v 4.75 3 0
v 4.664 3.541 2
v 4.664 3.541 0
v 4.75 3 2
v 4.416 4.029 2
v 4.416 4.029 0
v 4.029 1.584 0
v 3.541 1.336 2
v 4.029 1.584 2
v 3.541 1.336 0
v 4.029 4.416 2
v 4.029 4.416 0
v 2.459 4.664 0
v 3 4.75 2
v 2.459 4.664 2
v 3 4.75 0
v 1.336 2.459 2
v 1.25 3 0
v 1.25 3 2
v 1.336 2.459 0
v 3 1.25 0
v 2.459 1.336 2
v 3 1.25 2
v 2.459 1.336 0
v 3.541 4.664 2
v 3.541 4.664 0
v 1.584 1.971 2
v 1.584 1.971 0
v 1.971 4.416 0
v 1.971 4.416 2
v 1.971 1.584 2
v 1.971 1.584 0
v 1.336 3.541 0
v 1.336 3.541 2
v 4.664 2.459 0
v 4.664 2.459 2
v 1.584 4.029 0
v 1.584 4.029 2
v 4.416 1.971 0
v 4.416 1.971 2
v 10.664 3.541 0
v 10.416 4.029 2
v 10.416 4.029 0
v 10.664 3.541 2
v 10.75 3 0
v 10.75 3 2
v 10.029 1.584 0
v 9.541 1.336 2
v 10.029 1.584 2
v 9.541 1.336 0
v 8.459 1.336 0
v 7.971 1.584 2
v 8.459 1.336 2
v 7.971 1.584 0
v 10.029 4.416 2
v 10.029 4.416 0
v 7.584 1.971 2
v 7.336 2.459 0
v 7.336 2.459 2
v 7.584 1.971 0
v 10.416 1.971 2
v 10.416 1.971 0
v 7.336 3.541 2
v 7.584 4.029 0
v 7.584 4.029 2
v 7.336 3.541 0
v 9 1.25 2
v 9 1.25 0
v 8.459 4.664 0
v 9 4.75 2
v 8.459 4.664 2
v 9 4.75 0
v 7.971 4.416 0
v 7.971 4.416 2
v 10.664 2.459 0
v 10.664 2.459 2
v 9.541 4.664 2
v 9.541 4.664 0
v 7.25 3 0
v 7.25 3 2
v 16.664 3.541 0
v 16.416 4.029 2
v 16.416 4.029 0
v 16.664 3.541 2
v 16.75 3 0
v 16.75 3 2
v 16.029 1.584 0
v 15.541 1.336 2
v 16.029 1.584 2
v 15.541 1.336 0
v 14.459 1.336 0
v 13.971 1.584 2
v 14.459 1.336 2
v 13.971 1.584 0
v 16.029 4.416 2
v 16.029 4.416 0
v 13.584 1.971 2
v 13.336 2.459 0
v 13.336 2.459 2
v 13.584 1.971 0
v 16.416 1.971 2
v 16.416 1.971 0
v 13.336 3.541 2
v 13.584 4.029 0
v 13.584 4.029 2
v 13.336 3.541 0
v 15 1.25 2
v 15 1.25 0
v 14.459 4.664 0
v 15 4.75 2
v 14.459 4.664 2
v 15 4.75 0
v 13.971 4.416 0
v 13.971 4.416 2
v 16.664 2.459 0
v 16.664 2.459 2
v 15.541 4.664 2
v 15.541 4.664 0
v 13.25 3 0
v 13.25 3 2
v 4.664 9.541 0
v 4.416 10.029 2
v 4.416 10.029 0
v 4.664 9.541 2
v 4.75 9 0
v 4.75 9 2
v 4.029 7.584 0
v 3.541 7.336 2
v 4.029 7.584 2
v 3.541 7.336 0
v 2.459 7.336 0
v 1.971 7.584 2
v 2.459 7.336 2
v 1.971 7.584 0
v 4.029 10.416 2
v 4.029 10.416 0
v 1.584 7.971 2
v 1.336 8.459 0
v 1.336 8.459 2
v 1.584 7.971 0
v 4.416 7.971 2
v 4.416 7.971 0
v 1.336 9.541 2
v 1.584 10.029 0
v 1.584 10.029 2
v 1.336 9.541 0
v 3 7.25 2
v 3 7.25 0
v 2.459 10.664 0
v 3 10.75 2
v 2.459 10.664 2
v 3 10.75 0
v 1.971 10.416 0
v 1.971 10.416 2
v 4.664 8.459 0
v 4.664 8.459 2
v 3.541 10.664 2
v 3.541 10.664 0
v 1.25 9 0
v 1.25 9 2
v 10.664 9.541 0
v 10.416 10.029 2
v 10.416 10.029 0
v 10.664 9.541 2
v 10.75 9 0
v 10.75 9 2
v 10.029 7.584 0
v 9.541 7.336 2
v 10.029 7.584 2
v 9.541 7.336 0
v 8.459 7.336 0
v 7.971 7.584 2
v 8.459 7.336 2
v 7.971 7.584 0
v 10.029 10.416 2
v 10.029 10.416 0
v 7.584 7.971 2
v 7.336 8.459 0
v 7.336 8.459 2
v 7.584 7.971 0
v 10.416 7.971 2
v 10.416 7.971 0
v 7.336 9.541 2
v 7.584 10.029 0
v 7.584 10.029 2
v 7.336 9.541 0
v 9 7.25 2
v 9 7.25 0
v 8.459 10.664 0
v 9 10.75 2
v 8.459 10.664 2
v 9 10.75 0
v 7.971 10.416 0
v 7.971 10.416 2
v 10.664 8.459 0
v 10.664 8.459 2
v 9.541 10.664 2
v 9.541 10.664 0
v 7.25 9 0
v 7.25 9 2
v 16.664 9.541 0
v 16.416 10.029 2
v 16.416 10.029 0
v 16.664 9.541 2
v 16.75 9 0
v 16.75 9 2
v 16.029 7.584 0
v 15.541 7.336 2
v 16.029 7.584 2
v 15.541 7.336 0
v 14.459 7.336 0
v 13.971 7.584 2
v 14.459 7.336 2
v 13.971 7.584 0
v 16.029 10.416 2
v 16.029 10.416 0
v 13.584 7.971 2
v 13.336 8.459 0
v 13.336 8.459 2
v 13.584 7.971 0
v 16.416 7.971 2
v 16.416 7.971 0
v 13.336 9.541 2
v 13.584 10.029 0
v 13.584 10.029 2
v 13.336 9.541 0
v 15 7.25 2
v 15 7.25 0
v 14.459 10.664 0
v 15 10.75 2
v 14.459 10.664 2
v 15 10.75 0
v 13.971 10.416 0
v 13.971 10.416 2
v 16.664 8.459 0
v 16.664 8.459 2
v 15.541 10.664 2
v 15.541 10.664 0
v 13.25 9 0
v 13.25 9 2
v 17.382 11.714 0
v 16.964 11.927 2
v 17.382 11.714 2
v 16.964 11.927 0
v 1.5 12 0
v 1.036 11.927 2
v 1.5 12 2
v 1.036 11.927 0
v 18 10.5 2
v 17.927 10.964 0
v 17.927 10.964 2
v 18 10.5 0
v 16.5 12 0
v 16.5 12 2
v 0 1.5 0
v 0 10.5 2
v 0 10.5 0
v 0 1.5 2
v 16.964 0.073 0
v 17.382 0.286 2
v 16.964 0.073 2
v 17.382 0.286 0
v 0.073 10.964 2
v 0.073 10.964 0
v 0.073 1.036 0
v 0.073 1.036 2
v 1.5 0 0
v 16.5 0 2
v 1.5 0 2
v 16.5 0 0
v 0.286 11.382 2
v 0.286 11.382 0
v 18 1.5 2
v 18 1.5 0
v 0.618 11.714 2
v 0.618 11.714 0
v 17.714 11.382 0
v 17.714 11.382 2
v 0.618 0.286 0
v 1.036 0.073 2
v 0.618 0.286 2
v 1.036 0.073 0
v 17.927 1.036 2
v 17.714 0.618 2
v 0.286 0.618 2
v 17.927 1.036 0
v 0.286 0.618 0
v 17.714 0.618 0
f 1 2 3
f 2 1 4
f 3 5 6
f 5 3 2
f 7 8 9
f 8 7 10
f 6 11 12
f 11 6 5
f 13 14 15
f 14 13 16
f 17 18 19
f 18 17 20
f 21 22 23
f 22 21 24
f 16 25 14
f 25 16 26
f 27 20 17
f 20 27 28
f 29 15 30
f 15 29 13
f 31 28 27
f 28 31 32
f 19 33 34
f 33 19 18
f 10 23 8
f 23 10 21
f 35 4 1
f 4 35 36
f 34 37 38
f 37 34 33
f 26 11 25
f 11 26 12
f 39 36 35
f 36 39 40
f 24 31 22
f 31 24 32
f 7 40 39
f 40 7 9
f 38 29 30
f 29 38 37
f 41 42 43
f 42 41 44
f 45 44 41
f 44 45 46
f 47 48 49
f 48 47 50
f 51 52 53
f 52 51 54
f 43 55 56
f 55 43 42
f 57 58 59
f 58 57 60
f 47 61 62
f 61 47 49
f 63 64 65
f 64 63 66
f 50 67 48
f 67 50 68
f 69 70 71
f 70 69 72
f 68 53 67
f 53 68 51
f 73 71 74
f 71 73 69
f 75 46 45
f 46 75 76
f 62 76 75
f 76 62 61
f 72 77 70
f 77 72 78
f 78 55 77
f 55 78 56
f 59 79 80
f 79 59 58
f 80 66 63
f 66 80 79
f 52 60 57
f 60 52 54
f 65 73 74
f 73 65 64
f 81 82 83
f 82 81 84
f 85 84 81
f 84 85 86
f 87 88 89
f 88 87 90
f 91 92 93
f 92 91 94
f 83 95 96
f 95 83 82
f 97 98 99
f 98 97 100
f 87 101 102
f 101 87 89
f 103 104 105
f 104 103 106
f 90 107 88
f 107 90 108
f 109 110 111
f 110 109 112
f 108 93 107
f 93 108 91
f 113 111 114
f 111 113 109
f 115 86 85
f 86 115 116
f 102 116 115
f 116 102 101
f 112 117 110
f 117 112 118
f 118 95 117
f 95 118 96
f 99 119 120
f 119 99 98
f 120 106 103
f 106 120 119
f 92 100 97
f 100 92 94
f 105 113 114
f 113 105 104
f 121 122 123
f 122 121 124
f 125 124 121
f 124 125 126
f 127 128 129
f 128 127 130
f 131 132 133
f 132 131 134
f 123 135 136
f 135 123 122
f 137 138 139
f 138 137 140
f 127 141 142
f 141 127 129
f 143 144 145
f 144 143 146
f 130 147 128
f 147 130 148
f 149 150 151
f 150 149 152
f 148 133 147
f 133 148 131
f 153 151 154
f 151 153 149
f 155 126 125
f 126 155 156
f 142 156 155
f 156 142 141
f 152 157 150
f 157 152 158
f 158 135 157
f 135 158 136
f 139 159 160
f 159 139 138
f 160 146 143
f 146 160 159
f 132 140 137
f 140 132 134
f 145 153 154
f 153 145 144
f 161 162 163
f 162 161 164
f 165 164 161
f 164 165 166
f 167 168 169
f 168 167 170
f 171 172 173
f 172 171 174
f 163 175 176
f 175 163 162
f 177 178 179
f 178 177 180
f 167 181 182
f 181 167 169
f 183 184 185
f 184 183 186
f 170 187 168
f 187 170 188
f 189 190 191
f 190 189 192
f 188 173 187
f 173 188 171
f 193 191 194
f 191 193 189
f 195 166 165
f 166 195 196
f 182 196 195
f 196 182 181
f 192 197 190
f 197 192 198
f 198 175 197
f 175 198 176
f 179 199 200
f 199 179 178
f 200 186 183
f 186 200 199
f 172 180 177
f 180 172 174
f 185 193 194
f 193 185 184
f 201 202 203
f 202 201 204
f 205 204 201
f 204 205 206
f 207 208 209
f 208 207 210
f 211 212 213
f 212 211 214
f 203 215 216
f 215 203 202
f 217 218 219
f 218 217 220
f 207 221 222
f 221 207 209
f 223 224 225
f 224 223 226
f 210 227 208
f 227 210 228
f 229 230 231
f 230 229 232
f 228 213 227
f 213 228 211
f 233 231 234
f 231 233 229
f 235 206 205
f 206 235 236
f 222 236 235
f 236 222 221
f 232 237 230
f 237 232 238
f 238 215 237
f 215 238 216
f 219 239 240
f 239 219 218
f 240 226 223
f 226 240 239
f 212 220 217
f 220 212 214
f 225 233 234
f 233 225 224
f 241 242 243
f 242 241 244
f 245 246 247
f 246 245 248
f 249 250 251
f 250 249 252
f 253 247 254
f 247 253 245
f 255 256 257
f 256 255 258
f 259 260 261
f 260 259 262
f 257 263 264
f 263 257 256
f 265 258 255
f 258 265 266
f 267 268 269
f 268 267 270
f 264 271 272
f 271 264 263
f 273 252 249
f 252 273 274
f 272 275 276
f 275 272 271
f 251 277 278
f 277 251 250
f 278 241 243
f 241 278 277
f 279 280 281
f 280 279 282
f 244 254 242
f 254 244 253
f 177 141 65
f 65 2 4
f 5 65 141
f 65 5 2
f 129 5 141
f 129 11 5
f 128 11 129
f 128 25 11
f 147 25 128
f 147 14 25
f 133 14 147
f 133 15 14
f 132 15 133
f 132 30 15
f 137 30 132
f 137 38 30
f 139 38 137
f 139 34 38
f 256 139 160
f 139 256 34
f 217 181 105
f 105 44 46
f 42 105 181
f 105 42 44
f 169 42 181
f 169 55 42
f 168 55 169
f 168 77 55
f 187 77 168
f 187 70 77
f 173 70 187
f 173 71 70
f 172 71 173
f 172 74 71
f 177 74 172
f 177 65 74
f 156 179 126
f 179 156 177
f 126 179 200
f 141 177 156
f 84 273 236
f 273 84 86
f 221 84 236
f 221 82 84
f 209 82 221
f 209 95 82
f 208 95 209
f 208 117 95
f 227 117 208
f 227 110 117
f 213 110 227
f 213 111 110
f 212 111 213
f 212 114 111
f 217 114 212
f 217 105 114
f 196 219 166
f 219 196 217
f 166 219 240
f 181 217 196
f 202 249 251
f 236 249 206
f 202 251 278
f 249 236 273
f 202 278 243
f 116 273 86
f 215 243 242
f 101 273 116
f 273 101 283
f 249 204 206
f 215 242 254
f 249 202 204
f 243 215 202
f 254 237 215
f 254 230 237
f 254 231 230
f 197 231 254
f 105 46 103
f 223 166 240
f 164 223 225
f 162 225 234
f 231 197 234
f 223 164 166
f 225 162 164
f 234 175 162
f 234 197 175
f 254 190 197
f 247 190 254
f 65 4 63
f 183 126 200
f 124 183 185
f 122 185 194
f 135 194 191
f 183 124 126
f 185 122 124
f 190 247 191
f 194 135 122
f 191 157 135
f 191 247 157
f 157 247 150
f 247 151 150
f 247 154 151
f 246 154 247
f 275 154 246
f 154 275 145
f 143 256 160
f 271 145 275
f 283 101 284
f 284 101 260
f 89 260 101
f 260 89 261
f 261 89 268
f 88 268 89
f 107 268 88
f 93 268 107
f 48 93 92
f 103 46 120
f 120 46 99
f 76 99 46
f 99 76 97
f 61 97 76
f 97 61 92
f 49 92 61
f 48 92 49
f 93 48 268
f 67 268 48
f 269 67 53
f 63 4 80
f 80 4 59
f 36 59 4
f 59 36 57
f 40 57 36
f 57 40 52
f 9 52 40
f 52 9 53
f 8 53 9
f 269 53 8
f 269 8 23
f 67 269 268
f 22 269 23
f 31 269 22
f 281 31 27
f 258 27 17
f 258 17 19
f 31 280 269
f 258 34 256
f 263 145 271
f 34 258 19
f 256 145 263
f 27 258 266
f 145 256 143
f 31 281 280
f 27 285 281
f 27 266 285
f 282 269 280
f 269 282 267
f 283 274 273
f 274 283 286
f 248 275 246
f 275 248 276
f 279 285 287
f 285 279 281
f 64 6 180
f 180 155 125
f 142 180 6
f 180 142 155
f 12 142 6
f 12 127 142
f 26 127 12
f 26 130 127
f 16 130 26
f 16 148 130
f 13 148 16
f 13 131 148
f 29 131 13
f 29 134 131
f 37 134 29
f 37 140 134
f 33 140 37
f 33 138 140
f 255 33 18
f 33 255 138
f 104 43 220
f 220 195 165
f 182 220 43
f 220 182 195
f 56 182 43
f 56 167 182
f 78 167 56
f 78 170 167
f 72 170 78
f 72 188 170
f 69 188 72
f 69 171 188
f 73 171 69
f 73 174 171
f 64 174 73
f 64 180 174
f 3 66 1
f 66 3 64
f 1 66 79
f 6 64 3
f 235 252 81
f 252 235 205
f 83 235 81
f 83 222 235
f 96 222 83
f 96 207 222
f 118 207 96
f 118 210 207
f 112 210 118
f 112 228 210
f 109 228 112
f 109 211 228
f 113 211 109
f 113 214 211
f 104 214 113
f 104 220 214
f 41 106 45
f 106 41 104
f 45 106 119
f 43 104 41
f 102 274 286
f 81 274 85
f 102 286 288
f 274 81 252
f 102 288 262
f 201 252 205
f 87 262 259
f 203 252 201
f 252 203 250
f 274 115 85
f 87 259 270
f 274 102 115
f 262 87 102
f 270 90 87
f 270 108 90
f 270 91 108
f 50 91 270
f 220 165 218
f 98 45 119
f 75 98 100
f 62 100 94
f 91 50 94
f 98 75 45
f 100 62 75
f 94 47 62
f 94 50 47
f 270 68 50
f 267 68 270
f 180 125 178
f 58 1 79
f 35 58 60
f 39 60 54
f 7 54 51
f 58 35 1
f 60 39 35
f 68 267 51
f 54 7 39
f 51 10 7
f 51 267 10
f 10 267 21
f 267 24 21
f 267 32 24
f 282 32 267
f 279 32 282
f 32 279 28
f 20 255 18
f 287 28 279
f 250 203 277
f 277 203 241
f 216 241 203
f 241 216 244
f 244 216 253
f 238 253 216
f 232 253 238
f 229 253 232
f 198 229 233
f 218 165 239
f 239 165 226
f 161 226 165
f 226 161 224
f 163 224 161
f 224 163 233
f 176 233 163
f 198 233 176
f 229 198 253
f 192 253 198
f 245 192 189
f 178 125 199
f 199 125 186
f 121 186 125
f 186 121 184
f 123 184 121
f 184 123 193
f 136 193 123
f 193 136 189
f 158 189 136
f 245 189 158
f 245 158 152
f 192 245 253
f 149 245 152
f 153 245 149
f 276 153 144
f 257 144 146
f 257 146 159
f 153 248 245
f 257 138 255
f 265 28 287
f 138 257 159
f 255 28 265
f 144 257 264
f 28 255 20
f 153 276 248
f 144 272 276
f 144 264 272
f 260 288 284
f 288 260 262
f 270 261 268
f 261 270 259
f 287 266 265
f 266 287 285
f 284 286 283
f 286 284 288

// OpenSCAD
/*
Nut and Bolt Construction Kit, library and customiser code
By the DoomMeister
v1.0

>>>Parts to be implimented
Rectangle Plate n x n, v1.0
Circular Plate, v1.0
L_beam, v1.0
angle beam, v1.0 (scruffy a<90)
Free Shape Plate -- to follow
Wheel, v1.0
Pully, v1.0
Gears -- to follow
>>>tweakable Parameter
Hole Size
Hole ratio
Clearance
Pulley Cord diameter
>>>>Changes
v1.01, hole size now free entry
*/

//>>>>>>>>>>>>>>>>>>>>>>>>>>>>>>>>>>>>>>>>>>>>>>>>>>>>>>>>>>>>>>>
//Customiser Code
//For Library use comment this and the section bellow out
//>>>>>>>>>>>>>>>>>>>>>>>>>>>>>>>>>>>>>>>>>>>>>>>>>>>>>>>>>>>>>>>
///*
							//shape of part	
							shape = "plate";	// [plate,L_plate,angle_plate,round_plate,wheel,pully]
							//holes across, also used to determine size of round plate and gear
							x_holes=3;				//	
							//holes in the up down direction
							y_holes= 2;				//
							//holes on L plate side
							z_holes = 2;			//
							//of angle beam, or between holes on circle
							angle = 120;				// 
							//thickness of part
							thickness = 2;			//
							//size of screws and rod used
							screw_diameter = 3;	//
							//tweak,distance between holes in diameters
							hole_ratio = 1;		//
							//cord diameter for pullys
							cord_diameter = 1.5;  //
							//tweak, clearance on holes
							clearance = 0.5;		//[0.1:1]
							//tweak, round or square corners
							round_corners = "yes";	//[yes,no]
							//tweak, corner quality, nuber of facets
							quality = 20;  		//[10,25,50,100]
							
//>>>>>>>>>>>>>>>>>>>>>>>>>>>>>>>>>>>>>>>>>>>>>>>>>>>>>>>>>>>>>>>
//Test Section, draws the part. 
//For Library use follow this structure in your own code
//>>>>>>>>>>>>>>>>>>>>>>>>>>>>>>>>>>>>>>>>>>>>>>>>>>>>>>>>>>>>>>>
construction_set_part(		_shape = shape, 
							nx = x_holes, 
							ny = y_holes, 
							nz = z_holes,
							ang = angle,
							hd = screw_diameter,
							hr = hole_ratio,
							thk = thickness, 
							clr = clearance,
							corners = round_corners,
							qul = quality,
							crdd = cord_diameter);

//*/ 
//>>>>>>>>>>>>>>>>>>>>>>>>>>>>>>>>>>>>>>>>>>>>>>>>>>>>>>>>>>>>>>>
//Outer Module, does the selection work
//>>>>>>>>>>>>>>>>>>>>>>>>>>>>>>>>>>>>>>>>>>>>>>>>>>>>>>>>>>>>>>>
module construction_set_part(_shape = "rectangle", nx = 4, ny = 2,nz= 0, ang = 90, hd = 3,hr = 2,thk = 2,clr = 0.5, corners = "yes", crdd, qul = 10)
{
	echo(_shape,nx,ny,nz);
	if	(_shape=="plate")
		{
			color("red")
			plate_rectangle(_nx = nx, _ny = ny,_nz = 0, _hd = hd, _hr = hr,_thk = thk,_clr = clr, _corners=corners, _qul = qul);
		}
	if	(_shape=="L_plate")
		{
			color("green")
			plate_rectangle(_nx = nx, _ny = ny,_nz = nz,_ang=90, _hd = hd, _hr = hr,_thk = thk,_clr = clr, _corners=corners, _qul = qul);
		}
	if	(_shape=="angle_plate")
		{
			plate_angle(_nx = nx, _ny = ny,_nz = nz,_ang=ang, _hd = hd, _hr = hr,_thk = thk,_clr = clr, _corners=corners, _qul = qul);
		}
	if	(_shape=="round_plate")
		{
			color("blue")
			plate_round(_nx = nx, _ny = ny,_nz = nz,_ang = ang, _hd = hd, _hr = hr,_thk = thk,_clr = clr, _corners=corners, _qul = qul);
		}
	if	(_shape=="wheel")
		{
			color("purple")
			wheel(_nx = nx, _ny = ny,_nz = nz,_ang = ang, _hd = hd, _hr = hr,_thk = thk,_clr = clr, _corners=corners,_pully = false, _crrd=0, _qul = qul);
		}
	if	(_shape=="pully")
		{
			color("pink")
			wheel(_nx = nx, _ny = ny,_nz = nz,_ang = ang, _hd = hd, _hr = hr,_thk = thk,_clr = clr, _corners=corners,_pully = true, 				_crdd=crdd, _qul = qul);
		}
}

//>>>>>>>>>>>>>>>>>>>>>>>>>>>>>>>>>>>>>>>>>>>>>>>>>>>>>>>>>>>>>>>
//Inner Modules, draws the parts
//>>>>>>>>>>>>>>>>>>>>>>>>>>>>>>>>>>>>>>>>>>>>>>>>>>>>>>>>>>>>>>>

module plate_rectangle(_nx = 4, _ny = 1,_nz=0,_ang=90, _hd = 3, _hr = 2,_thk = 2,_clr = 0.5, _corners="yes", _qul = 10)
{
//module to draw flat plates and L beams.
_wi = _hd * (_hr+1);
_w = _wi * _nx;
_h = _wi * _ny;
_z = (_wi * _nz)+(_thk*(_nz/_nz));
echo("build area required(x\y\z)",_w,_h,_z);

union()
	{
		_plate_rectangle(__nx = _nx, __ny = _ny, __hd = _hd, __hr = _hr,__thk = _thk,__clr = _clr, __corners=_corners, __qul = _qul);
		if(_nz>0)
			{
				translate([0,0,_thk])
				rotate([90,0,0])
					_plate_rectangle(__nx = _nx, __ny = _nz, __hd = _hd, __hr = _hr,__thk = _thk,__clr = _clr, __corners=_corners, __qul = _qul);
				translate([0,-_thk,0])
					cube([_w,_thk,_thk]);
				translate([0,-_thk,0])
					cube([_thk,_thk+_hd/2,_thk]);
				translate([0,-_thk,0])
					cube([_thk,_thk,_thk+_hd/2]);
				translate([_w-_thk,-_thk,0])
					cube([_thk,_thk+_hd/2,_thk]);
				translate([_w-_thk,-_thk,0])
					cube([_thk,_thk,_thk+_hd/2]);
			}

	}

}

module plate_angle(_nx = 4, _ny = 1,_nz=0,_ang=90, _hd = 3, _hr = 2,_thk = 2,_clr = 0.5, _corners="yes", _qul = 10)
{
//module to draw flat plates and L beams.
_wi = _hd * (_hr+1);
_w = _wi * _nz;
_h = _wi * _ny;
_z = (_wi * _nz)+(_thk*(_nz/_nz));
_xl = _thk*tan(90-_ang/2);
_xm = (_thk*sin(_ang/2));
_xn = _thk*cos(_ang/2);
echo("build area required(x\y\z)",_w,_h,_z,_xl);

union()
	{
		
		rotate([0,270,-_ang/2])
		translate([0,0,-_thk])
			_plate_rectangle(__nx = _nz, __ny = _nx, __hd = _hd, __hr = _hr,__thk = _thk,__clr = _clr, __corners=_corners, __qul = _qul);
		translate([0,0,0])
		rotate([0,270,_ang/2])
			_plate_rectangle(__nx = _nz, __ny = _ny, __hd = _hd, __hr = _hr,__thk = _thk,__clr = _clr, __corners=_corners, __qul = _qul);
	if(_ang>90)
		{
		rotate([0,270,-_ang/2])
		translate([0,-_xl,-_thk])
			cube([_w,_hd/2+_xl,_thk]);
		rotate([0,270,_ang/2])
		translate([0,-_xl,0])
			cube([_w,_hd/2+_xl,_thk]);
		}

	if(_ang<90)
		{
			translate([-_xn,-_xm,0])
				cube([(_xn)*2,_xm,_w]);
			
			cylinder(r=(_wi-_hd)/3, h=_w, $fn=_qul);
		}

	}

}


module plate_round(_nx = 4, _ny = 1,_nz=0,_ang = 90, _hd = 3, _hr = 2,_thk = 2,_clr = 0.5, _corners="yes", _qul = 10)
{
//module to make round plate with n holes at specified angle
_wi = _hd * (_hr+1);
_w = _wi * _nx;
_h = _wi * _ny;
_eff_d = _w-(_hd*2);
_c = 3.142 *_eff_d;
_nh = 360 / _ang;
_ha = 360/_nh;

echo("Build area (xyz)", _w,_w,_eff_d,_nh,_c);

difference()
	{
	cylinder(r=_w/2, h=_thk, $fn=_qul);
	for(nh = [0:_nh-1])
		{
			for( ri = [0:round(_nx/2)])
			{
			rotate([0,0,nh*_ha])
			translate([ri*_wi,0,-1])
				cylinder(r=(_hd+_clr)/2, h = _thk+2, $fn=_qul);
			}

		}
			/*translate([0,0,-1])
				cylinder(r=(_hd+_clr)/2, h = _thk+2, $fn=_qul);*/
	}
}


module wheel(_nx = 4, _ny = 1,_nz=0,_ang = 90, _hd = 3, _hr = 2,_thk = 2,_clr = 0.5, _corners="yes",_pully=false,_crdd=1, _qul = 10)
{
//module to make wheels and pulleys
_wi = _hd * (_hr+1);
_w = _wi * _nx;
_cr = _thk*1;


echo("Build area (xyz)", _w+(2*_cr),_w+(2*_cr),2*_cr);

difference()
	{
		union()
		{
			translate([0,0,-_cr])
			cylinder(r=_w/2, h=_thk, $fn=_qul);
			translate([0,0,-_cr])
			cylinder(r=(_hd+_clr), h = _thk +_cr, $fn=_qul);
			rotate_extrude(convexity = 10)
			translate([_w/2,0,_cr])
			//rotate([90,0,0])
				circle(r = _cr, $fn=_qul);

		}
			if(_pully)
				{
					rotate_extrude(convexity = 10)
					translate([(_w+_cr)/2,0,_cr])
						circle(r = (_crdd)/2, $fn=_qul);
					rotate_extrude(convexity = 10)
					translate([(_w+_cr)/2,-_crdd/2,0])
						square([_crdd+_cr,_crdd]);
				}

			translate([0,0,-_cr-1])
				cylinder(r=(_hd+_clr)/2, h = _thk+2+_cr, $fn=_qul);
	}
}

//>>>>>>>>>>>>>>>>>>>>>>>>>>>>>>>>>>>>>>>>>>>>>>>>>>>>>>>>>>>>>>>
//Support Modules, draws bits of the parts
//>>>>>>>>>>>>>>>>>>>>>>>>>>>>>>>>>>>>>>>>>>>>>>>>>>>>>>>>>>>>>>>
module hole(_id = 3, _od = 6,__thk = 2,__qul = 10)
{
_ir = _id/2;
_or = _od/2;

	difference()
	{
		cylinder(r = _or, h=__thk, $fn = __qul);
		translate([0,0,-1])
			cylinder(r = _ir, h=__thk+2, $fn = __qul);
	}
}

module _plate_rectangle(__nx = 4, __ny = 1, __hd = 3, __hr = 2,__thk = 2,__clr = 0.5, __corners="yes", __qul = 10)
{
//module to draw flat plates and L beams.
__wi = __hd * (__hr+1);
__w = __wi * __nx;
__h = __wi * __ny;

	difference()
	{	
		if (__corners=="yes")
		{
			union()
			{
				minkowski()
				{
					cube([__w-__hd,__h-__hd,__thk/2]);
					translate([__hd/2,__hd/2,0])
						cylinder(r = __hd/2, h = __thk/2, $fn = __qul);
				}}



		}
		if (__corners=="no")
		{
			union()
			{
				cube([__w,__h,__thk]);

			}
		}
		for
			( y = [0:__ny-1])
			{
			for( x = [0:__nx-1])
			{
				#translate([__wi/2+(x*__wi),__wi/2+(y*__wi),-1])
					cylinder(r = (__hd + __clr)/2, h = __thk + 2, $fn = __qul);
			}}
	}

}

//>>>>>>>>>>>>>>>>>>>>>>>>>>>>>>>>>>>>>>>>>>>>>>>>>>>>>>>>>>>>>>>
//Dev Modules, not working yet
//>>>>>>>>>>>>>>>>>>>>>>>>>>>>>>>>>>>>>>>>>>>>>>>>>>>>>>>>>>>>>>>
module plate_free(_nx = 4, _ny = 1,_nz=0, _hd = 3, _hr = 2,_thk = 2,_clr = 0.5, _corners="yes", _qul = 10)
{
//atempt to build a plate of any rows
_wi = _hd * (_hr+1);
_w = _wi * _nx;
_h = _wi * _ny;
_z = (_wi * _nz)+(_thk*(_nz/_nz));
echo("build area required(x\y\z)");

		union(){
		for(yi= [0:4-1])
		{
			for(xi = [1,3,4,2,3,4,2])
			{
			for(i= [	[_wi*xi,_wi*yi],
					
					])
			{
				translate(i)
						hole(_id=_hd+_clr, _od=_wi, __thk = _thk, __qul = _qul);
			}}}
		}
}
